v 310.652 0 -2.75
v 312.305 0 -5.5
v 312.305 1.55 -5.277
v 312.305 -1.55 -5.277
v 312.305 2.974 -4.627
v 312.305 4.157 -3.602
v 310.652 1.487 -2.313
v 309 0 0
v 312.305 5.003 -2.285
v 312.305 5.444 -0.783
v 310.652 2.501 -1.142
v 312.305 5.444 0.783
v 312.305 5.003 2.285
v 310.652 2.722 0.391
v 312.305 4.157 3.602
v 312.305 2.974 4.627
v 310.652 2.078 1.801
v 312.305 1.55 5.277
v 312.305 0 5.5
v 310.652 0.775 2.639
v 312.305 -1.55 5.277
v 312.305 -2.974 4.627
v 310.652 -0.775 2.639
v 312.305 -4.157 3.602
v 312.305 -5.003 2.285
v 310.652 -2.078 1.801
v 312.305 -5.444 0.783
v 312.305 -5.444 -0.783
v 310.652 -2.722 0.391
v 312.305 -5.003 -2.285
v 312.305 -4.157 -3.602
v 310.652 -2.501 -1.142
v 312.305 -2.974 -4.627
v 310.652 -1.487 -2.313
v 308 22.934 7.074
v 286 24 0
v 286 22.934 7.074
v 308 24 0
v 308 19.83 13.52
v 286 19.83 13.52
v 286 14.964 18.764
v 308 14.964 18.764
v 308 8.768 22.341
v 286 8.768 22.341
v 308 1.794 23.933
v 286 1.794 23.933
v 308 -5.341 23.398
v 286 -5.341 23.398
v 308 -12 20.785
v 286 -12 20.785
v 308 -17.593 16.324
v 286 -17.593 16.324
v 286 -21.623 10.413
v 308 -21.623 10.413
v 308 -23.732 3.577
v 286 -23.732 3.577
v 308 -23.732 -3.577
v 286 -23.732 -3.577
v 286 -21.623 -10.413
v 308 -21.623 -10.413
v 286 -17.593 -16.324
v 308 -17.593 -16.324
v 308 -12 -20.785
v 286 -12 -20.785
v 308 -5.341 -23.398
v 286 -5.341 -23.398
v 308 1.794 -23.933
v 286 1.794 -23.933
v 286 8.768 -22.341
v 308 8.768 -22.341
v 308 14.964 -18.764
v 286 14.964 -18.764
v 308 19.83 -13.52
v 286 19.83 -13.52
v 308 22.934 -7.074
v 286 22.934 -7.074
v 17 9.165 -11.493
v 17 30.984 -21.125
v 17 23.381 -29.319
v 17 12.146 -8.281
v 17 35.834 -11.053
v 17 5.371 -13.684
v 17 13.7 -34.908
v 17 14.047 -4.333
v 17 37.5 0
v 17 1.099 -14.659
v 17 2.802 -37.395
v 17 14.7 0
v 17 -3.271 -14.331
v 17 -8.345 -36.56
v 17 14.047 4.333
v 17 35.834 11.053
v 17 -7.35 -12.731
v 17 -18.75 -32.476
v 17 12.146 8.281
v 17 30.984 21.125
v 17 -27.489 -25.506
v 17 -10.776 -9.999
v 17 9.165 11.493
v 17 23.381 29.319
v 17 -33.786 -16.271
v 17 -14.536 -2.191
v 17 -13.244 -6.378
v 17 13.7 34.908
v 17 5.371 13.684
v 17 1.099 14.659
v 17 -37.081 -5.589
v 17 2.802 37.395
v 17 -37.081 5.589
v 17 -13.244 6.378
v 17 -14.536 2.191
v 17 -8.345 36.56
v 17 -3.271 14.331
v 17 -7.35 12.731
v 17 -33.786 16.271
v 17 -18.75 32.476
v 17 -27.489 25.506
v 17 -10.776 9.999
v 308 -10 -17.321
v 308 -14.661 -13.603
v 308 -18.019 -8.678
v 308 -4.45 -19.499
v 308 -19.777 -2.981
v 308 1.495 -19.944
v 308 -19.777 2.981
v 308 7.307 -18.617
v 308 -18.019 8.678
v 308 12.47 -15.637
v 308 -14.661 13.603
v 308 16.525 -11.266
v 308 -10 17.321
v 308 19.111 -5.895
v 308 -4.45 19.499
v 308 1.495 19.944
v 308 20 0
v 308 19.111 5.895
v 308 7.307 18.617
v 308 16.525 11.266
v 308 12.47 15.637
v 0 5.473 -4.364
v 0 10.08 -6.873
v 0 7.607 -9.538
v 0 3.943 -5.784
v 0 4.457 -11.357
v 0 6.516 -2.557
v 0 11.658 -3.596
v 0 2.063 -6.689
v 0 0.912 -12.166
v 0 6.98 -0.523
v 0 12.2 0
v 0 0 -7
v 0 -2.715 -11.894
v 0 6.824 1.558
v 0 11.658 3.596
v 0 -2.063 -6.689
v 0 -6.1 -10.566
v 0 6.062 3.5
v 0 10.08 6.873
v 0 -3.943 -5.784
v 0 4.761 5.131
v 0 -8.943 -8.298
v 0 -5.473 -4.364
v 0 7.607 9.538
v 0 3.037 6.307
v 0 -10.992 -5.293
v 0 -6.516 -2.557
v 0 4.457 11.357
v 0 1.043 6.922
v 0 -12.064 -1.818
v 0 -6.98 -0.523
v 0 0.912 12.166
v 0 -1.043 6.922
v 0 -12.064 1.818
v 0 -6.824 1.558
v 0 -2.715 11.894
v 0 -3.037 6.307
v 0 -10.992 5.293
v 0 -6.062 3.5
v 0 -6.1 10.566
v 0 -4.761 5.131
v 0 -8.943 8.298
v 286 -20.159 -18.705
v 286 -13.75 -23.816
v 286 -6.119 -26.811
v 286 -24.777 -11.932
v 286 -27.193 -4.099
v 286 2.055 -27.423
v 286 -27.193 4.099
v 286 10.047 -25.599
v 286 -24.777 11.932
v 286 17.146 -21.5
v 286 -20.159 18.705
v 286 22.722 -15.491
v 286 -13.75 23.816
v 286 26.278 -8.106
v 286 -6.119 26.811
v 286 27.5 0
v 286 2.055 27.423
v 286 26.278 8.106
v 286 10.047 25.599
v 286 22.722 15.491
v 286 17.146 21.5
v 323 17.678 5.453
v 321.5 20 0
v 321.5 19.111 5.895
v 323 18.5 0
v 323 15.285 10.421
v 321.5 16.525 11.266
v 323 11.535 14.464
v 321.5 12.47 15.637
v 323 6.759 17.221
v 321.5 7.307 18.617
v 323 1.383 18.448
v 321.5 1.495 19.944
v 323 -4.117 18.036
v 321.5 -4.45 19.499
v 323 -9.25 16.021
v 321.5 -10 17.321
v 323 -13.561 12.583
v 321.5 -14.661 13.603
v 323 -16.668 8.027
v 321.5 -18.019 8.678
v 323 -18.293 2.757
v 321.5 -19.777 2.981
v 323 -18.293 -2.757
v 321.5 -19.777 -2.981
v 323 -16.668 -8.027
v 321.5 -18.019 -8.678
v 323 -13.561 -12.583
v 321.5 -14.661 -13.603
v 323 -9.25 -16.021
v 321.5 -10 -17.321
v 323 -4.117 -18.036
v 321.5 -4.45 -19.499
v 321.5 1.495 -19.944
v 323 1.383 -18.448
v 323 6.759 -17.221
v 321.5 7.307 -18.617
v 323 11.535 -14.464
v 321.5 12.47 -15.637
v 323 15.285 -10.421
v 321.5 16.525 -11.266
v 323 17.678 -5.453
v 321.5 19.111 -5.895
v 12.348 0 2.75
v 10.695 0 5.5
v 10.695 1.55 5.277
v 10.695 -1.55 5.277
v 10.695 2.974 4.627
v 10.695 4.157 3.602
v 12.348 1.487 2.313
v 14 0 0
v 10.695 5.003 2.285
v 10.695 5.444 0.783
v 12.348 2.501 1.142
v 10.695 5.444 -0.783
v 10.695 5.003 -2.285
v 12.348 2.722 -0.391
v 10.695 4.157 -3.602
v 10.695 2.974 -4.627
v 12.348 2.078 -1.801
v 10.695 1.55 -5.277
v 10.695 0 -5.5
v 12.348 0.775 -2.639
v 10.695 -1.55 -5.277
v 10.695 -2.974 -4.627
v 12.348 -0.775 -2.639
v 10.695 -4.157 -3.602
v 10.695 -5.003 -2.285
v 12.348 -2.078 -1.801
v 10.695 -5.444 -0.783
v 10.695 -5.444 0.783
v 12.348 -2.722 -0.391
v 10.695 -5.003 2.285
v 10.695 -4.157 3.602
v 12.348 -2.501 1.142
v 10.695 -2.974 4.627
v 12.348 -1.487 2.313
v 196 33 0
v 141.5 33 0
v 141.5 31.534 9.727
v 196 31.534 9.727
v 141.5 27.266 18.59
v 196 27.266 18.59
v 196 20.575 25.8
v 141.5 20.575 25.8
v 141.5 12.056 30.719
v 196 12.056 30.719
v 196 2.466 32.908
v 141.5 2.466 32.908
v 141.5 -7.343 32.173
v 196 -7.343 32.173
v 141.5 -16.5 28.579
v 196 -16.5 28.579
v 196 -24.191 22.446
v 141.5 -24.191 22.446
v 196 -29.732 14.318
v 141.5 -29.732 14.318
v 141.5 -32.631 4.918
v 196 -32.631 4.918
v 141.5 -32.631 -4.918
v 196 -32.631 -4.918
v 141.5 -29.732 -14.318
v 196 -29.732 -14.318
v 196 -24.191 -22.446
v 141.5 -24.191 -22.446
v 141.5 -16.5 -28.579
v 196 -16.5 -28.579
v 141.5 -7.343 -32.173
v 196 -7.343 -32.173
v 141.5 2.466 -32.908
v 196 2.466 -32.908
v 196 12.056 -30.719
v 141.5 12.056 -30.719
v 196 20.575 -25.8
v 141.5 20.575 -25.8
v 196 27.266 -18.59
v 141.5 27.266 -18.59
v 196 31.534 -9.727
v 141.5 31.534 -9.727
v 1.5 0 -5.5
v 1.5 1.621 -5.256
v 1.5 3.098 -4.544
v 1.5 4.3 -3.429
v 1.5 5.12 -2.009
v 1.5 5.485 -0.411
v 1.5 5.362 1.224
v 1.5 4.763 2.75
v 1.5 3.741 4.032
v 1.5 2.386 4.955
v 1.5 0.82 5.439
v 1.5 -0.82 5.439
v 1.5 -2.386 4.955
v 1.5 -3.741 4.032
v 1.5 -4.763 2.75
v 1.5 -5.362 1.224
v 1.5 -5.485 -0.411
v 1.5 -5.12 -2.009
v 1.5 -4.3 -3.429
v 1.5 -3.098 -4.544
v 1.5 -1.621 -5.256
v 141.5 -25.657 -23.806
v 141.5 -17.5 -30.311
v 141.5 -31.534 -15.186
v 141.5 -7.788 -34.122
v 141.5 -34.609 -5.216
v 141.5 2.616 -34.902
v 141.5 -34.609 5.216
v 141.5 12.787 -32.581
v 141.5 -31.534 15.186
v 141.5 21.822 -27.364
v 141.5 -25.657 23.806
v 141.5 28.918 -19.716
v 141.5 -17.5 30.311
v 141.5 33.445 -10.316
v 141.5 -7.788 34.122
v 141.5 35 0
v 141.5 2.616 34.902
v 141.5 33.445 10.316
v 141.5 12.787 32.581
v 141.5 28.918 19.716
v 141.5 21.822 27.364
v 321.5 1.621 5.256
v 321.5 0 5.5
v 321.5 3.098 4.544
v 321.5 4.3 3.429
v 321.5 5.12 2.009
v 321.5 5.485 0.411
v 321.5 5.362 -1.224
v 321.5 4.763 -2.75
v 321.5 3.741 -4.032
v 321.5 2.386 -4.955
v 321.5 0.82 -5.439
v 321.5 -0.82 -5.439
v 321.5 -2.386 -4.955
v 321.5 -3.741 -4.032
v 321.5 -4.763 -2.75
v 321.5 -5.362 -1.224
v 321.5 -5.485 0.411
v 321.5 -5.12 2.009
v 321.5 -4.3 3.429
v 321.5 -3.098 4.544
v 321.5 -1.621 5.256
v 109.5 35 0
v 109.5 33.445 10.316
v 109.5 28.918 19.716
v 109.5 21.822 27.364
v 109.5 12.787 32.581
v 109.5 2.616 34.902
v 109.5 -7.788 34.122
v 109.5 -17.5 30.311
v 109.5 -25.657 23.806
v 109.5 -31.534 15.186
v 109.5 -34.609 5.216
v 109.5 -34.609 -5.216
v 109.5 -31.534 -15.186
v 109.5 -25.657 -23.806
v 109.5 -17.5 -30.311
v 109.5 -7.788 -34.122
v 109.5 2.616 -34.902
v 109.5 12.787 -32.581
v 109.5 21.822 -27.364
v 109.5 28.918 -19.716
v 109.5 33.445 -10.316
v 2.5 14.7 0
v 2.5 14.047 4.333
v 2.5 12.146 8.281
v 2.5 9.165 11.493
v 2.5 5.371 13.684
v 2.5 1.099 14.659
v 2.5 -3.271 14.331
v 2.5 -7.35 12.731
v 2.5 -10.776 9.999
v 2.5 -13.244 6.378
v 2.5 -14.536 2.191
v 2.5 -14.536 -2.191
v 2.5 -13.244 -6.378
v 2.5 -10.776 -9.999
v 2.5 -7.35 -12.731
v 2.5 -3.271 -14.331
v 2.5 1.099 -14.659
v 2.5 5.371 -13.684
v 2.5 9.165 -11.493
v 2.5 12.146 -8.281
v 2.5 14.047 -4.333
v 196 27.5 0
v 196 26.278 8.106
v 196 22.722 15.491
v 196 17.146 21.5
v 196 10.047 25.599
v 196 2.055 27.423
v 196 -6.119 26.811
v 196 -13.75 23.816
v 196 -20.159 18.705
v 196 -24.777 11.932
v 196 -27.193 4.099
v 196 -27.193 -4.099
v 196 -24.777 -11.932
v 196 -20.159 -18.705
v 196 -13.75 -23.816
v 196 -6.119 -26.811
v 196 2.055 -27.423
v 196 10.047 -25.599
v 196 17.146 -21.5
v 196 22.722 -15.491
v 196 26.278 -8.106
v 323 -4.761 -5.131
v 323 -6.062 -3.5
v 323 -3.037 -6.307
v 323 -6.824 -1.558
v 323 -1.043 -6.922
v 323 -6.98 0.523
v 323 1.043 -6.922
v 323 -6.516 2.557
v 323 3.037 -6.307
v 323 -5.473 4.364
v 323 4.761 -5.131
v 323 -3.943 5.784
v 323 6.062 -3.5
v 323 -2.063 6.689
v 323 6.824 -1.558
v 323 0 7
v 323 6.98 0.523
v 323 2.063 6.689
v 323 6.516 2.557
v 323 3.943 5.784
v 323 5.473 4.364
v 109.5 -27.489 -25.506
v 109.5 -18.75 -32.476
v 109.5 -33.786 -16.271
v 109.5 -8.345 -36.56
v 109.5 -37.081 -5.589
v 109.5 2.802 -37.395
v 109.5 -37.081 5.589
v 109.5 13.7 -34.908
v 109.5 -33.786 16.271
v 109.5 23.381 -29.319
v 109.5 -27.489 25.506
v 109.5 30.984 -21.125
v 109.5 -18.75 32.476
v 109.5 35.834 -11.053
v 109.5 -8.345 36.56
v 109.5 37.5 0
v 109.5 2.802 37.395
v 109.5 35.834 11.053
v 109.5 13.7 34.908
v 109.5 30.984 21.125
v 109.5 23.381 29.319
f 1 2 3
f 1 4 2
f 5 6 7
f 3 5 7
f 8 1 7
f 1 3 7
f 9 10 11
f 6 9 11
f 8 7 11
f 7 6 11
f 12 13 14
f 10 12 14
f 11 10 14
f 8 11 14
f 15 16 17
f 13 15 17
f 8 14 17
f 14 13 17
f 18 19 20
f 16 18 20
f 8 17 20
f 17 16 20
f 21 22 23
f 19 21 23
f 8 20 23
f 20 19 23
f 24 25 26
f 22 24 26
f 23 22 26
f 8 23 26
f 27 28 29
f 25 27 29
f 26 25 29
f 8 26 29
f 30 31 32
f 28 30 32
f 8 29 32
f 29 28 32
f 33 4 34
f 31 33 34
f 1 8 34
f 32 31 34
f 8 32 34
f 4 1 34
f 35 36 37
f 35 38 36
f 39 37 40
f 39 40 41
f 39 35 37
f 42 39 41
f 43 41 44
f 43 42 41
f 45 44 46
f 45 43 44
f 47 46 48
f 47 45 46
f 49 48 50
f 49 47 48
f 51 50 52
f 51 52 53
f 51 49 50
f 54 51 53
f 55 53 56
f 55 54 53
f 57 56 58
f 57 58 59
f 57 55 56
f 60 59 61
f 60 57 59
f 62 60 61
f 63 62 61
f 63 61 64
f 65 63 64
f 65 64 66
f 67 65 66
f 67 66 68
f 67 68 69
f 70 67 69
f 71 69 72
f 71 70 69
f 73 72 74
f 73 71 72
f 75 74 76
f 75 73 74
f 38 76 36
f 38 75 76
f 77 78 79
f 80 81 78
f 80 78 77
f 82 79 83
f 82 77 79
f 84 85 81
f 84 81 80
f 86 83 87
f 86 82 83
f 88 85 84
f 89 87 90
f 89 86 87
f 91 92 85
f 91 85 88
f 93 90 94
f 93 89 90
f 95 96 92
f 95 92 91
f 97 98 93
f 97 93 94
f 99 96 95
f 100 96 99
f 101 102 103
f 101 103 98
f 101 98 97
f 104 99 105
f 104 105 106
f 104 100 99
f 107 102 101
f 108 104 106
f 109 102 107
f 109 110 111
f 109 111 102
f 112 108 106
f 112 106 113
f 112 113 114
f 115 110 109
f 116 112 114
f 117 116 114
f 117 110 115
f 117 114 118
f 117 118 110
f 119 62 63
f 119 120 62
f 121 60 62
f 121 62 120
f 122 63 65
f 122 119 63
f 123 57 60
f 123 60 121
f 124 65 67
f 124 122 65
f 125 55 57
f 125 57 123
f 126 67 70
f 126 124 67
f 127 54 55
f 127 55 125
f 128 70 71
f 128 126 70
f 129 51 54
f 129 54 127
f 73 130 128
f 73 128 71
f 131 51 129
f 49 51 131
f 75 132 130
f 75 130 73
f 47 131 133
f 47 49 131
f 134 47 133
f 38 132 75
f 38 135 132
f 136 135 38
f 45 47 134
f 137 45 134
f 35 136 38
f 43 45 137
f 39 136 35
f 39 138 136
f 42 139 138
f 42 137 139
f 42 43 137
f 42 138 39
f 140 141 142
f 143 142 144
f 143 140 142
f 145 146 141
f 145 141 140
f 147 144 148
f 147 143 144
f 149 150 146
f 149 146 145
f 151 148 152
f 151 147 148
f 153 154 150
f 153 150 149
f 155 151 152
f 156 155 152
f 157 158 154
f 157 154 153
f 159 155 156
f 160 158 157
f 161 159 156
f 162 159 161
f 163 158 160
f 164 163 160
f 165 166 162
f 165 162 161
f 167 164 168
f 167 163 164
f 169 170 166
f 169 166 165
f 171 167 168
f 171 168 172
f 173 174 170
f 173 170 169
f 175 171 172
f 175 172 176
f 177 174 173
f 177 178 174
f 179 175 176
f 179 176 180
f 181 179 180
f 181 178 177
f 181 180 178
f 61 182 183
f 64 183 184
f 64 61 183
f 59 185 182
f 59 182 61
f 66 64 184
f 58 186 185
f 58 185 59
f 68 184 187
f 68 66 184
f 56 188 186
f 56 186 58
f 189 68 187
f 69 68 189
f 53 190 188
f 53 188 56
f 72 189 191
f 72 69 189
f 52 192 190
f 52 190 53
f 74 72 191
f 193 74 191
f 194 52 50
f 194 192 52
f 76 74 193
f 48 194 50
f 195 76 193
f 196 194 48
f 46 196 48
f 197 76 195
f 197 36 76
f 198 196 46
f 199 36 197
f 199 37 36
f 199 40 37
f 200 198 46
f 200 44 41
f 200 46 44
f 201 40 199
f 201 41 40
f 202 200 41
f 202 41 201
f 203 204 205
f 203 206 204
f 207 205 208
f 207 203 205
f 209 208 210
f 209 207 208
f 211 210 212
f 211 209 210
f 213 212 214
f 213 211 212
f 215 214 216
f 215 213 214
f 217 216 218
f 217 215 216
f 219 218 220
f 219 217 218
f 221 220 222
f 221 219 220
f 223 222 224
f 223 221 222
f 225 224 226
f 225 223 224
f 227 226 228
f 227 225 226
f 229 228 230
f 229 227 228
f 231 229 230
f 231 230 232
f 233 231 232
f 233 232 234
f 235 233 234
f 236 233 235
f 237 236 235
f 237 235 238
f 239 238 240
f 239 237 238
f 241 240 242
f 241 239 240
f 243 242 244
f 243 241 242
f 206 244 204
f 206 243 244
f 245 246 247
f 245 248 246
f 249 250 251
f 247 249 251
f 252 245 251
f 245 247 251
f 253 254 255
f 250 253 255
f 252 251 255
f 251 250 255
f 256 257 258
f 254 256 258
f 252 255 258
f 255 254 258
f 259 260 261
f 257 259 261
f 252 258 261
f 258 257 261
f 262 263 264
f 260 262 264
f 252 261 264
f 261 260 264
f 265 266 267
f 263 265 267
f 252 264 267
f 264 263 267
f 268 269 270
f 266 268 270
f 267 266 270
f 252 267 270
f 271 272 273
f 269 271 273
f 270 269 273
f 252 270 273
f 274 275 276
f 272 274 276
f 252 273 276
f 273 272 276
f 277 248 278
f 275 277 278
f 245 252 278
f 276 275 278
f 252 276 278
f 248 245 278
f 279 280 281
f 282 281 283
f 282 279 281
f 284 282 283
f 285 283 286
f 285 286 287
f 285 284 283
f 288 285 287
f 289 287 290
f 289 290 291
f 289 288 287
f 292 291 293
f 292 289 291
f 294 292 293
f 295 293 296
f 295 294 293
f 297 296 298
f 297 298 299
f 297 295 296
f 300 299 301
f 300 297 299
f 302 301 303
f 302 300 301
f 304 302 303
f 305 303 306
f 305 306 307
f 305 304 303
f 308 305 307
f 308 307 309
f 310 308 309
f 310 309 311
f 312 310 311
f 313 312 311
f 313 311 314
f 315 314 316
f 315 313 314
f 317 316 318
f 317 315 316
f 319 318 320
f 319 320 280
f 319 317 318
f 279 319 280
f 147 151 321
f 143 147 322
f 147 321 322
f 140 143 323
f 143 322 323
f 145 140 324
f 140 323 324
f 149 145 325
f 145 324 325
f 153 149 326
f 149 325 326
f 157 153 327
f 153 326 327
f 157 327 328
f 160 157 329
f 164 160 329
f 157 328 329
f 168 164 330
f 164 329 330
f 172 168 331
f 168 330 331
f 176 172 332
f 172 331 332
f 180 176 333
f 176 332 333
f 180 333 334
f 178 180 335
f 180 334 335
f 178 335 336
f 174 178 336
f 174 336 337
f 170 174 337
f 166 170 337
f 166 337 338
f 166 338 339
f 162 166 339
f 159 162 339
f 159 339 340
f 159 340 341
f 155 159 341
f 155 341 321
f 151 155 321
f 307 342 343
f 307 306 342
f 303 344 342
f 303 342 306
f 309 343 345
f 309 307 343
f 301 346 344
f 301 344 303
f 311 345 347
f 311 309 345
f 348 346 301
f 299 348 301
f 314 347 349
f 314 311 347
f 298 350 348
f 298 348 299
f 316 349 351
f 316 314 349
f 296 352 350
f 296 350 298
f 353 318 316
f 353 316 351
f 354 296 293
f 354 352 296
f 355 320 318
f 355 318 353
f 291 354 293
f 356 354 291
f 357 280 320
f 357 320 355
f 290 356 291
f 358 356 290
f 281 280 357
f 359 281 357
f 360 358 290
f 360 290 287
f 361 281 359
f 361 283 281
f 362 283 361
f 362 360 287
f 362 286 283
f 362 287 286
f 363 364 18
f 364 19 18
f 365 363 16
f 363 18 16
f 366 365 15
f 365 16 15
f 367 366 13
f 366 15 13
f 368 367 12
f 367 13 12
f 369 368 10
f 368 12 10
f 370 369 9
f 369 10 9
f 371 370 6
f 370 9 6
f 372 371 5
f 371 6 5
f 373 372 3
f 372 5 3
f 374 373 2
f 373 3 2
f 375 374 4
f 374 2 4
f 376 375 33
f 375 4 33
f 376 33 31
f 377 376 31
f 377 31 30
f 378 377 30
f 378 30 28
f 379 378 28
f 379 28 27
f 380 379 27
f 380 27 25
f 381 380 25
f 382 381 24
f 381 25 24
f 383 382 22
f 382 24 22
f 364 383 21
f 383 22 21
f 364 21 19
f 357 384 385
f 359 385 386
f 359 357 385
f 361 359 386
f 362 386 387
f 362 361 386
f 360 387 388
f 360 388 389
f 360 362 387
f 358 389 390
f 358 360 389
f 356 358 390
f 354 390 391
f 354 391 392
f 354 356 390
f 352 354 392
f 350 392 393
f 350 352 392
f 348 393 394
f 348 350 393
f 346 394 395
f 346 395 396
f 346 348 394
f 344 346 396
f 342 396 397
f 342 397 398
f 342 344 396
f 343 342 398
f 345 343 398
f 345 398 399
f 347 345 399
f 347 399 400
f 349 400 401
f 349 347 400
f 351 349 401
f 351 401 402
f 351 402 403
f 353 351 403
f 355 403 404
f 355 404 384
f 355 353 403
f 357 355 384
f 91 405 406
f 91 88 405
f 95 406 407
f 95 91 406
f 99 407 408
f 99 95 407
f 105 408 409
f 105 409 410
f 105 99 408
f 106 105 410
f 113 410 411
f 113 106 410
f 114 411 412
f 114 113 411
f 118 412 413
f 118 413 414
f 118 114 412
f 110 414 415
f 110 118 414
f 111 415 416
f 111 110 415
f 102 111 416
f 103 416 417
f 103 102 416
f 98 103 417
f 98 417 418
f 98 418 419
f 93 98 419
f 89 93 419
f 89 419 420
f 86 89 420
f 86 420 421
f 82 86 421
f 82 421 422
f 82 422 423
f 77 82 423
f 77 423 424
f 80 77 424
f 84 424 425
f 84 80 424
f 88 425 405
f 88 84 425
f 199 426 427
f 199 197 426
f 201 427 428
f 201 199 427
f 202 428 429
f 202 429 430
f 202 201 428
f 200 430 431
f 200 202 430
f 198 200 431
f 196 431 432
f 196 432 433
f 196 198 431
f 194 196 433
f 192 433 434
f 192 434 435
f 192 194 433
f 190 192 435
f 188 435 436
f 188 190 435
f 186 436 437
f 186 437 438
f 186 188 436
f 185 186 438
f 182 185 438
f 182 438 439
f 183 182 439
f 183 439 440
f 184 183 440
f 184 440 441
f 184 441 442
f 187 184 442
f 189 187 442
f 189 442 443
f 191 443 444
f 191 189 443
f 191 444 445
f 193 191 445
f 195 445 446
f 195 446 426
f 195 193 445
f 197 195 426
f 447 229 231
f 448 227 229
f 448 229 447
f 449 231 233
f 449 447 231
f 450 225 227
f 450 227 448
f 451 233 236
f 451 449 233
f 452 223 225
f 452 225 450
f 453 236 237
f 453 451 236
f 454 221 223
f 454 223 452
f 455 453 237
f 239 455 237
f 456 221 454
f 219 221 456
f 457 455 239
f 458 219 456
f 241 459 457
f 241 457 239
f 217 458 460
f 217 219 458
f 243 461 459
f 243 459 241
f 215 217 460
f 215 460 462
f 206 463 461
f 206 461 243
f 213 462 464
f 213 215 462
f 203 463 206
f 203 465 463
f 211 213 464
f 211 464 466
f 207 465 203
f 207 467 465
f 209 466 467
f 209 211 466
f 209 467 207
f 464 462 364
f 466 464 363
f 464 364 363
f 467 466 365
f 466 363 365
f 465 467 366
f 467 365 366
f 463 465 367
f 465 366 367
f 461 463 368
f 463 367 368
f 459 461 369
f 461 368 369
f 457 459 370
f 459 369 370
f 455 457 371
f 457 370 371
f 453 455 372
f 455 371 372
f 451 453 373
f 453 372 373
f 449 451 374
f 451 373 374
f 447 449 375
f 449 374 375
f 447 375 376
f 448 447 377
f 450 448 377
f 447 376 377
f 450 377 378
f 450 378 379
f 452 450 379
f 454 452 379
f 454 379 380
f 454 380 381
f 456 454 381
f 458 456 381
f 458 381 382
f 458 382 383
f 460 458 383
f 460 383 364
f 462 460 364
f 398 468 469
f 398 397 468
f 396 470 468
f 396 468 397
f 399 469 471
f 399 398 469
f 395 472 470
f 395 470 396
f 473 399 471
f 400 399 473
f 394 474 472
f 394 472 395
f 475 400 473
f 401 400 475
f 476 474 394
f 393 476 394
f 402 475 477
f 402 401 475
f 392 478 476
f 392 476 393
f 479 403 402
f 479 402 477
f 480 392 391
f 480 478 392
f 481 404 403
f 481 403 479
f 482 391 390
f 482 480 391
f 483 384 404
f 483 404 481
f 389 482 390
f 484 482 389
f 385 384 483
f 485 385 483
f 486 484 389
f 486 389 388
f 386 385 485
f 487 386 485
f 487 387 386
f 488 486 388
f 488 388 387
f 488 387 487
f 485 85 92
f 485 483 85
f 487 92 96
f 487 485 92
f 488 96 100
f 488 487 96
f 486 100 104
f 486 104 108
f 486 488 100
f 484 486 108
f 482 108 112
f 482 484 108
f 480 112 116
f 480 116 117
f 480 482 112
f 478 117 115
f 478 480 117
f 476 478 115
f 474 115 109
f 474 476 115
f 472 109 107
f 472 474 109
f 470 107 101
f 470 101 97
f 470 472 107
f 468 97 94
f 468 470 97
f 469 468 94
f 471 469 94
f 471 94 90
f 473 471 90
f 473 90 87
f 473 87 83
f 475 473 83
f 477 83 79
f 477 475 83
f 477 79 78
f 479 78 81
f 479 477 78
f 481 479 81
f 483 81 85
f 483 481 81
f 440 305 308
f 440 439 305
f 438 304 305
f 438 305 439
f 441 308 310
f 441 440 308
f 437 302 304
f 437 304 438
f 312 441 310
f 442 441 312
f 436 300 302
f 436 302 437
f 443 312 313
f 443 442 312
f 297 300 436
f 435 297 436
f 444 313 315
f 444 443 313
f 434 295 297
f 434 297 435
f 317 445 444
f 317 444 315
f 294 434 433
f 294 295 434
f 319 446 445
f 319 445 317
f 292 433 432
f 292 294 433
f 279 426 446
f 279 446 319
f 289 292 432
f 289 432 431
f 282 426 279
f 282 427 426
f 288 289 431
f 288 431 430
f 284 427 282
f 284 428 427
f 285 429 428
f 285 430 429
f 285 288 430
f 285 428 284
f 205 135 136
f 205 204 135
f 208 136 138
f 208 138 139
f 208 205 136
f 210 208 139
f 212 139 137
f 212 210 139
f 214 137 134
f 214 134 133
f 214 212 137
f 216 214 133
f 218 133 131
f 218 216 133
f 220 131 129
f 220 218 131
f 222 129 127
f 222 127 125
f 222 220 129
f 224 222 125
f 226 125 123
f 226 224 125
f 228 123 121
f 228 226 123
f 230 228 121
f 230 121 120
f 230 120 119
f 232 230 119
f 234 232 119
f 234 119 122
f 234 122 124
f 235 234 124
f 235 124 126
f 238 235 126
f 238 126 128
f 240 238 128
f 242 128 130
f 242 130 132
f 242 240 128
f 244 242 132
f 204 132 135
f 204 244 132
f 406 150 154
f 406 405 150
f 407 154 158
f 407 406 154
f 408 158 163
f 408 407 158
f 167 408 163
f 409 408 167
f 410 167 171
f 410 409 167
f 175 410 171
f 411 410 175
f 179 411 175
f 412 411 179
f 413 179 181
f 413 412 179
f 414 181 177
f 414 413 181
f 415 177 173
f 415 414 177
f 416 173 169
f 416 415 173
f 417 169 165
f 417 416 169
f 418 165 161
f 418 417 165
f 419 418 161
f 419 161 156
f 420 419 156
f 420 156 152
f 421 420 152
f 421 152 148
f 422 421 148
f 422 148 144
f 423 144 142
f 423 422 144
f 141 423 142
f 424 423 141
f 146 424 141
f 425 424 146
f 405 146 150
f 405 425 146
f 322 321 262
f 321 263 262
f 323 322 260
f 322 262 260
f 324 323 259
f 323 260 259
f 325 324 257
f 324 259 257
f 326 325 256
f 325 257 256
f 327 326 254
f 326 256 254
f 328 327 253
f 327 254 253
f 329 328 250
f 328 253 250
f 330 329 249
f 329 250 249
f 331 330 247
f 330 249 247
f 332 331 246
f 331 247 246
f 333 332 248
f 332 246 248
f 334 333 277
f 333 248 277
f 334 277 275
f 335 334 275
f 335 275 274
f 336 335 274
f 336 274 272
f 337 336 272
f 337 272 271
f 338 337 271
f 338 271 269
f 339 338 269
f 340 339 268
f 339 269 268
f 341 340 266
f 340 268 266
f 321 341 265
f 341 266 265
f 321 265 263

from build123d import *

# Parameters (mm, degrees)
CSK_FOR_M10_COUNTERSUNK_FLAT_HEAD_SCREW1_D           = 11
CSK_FOR_M10_COUNTERSUNK_FLAT_HEAD_SCREW1_DEPTH       = 10.695266595
CSK_FOR_M10_COUNTERSUNK_FLAT_HEAD_SCREW1_CSINK_D     = 14
CSK_FOR_M10_COUNTERSUNK_FLAT_HEAD_SCREW1_CSINK_ANGLE = 90
CSK_FOR_M10_COUNTERSUNK_FLAT_HEAD_SCREW1_TIP         = 3.304733405
CSK_FOR_M10_COUNTERSUNK_FLAT_HEAD_SCREW2_D           = 11
CSK_FOR_M10_COUNTERSUNK_FLAT_HEAD_SCREW2_DEPTH       = 10.695266595
CSK_FOR_M10_COUNTERSUNK_FLAT_HEAD_SCREW2_CSINK_D     = 14
CSK_FOR_M10_COUNTERSUNK_FLAT_HEAD_SCREW2_CSINK_ANGLE = 90
CSK_FOR_M10_COUNTERSUNK_FLAT_HEAD_SCREW2_TIP         = 3.304733405


with BuildPart() as part:
    # Sketch1 → Revolve1 (revolve)
    with BuildSketch(Plane.XY):
        Polygon((0, 0), (0, 12.2), (2.5, 14.7), (17, 14.7), (17, 37.5), (109.5, 37.5), (109.5, 35), (141.5, 35), (141.5, 33), (196, 33), (196, 27.5), (286, 27.5), (286, 24), (308, 24), (308, 20), (321.5, 20), (323, 18.5), (323, 0), align=None)
    revolve(axis=Axis((0, 0, 0), (1, 0, 0)))

    # CSK for M10 Countersunk Flat Head Screw1
    with Locations(Plane.ZY):
        with Locations((0, 0)):
            CounterSinkHole(CSK_FOR_M10_COUNTERSUNK_FLAT_HEAD_SCREW1_D / 2, CSK_FOR_M10_COUNTERSUNK_FLAT_HEAD_SCREW1_CSINK_D / 2, depth=CSK_FOR_M10_COUNTERSUNK_FLAT_HEAD_SCREW1_DEPTH, counter_sink_angle=CSK_FOR_M10_COUNTERSUNK_FLAT_HEAD_SCREW1_CSINK_ANGLE)
            with Locations((0, 0, -(CSK_FOR_M10_COUNTERSUNK_FLAT_HEAD_SCREW1_DEPTH + CSK_FOR_M10_COUNTERSUNK_FLAT_HEAD_SCREW1_TIP / 2))):  # 118° drill point
                Cone(0, CSK_FOR_M10_COUNTERSUNK_FLAT_HEAD_SCREW1_D / 2, CSK_FOR_M10_COUNTERSUNK_FLAT_HEAD_SCREW1_TIP, mode=Mode.SUBTRACT)

    # CSK for M10 Countersunk Flat Head Screw2
    with Locations(Plane(origin=(323, 0, 0), x_dir=(0, 0, -1), z_dir=(1, 0, 0))):
        with Locations((0, 0)):
            CounterSinkHole(CSK_FOR_M10_COUNTERSUNK_FLAT_HEAD_SCREW2_D / 2, CSK_FOR_M10_COUNTERSUNK_FLAT_HEAD_SCREW2_CSINK_D / 2, depth=CSK_FOR_M10_COUNTERSUNK_FLAT_HEAD_SCREW2_DEPTH, counter_sink_angle=CSK_FOR_M10_COUNTERSUNK_FLAT_HEAD_SCREW2_CSINK_ANGLE)
            with Locations((0, 0, -(CSK_FOR_M10_COUNTERSUNK_FLAT_HEAD_SCREW2_DEPTH + CSK_FOR_M10_COUNTERSUNK_FLAT_HEAD_SCREW2_TIP / 2))):  # 118° drill point
                Cone(0, CSK_FOR_M10_COUNTERSUNK_FLAT_HEAD_SCREW2_D / 2, CSK_FOR_M10_COUNTERSUNK_FLAT_HEAD_SCREW2_TIP, mode=Mode.SUBTRACT)


solid = part.part
